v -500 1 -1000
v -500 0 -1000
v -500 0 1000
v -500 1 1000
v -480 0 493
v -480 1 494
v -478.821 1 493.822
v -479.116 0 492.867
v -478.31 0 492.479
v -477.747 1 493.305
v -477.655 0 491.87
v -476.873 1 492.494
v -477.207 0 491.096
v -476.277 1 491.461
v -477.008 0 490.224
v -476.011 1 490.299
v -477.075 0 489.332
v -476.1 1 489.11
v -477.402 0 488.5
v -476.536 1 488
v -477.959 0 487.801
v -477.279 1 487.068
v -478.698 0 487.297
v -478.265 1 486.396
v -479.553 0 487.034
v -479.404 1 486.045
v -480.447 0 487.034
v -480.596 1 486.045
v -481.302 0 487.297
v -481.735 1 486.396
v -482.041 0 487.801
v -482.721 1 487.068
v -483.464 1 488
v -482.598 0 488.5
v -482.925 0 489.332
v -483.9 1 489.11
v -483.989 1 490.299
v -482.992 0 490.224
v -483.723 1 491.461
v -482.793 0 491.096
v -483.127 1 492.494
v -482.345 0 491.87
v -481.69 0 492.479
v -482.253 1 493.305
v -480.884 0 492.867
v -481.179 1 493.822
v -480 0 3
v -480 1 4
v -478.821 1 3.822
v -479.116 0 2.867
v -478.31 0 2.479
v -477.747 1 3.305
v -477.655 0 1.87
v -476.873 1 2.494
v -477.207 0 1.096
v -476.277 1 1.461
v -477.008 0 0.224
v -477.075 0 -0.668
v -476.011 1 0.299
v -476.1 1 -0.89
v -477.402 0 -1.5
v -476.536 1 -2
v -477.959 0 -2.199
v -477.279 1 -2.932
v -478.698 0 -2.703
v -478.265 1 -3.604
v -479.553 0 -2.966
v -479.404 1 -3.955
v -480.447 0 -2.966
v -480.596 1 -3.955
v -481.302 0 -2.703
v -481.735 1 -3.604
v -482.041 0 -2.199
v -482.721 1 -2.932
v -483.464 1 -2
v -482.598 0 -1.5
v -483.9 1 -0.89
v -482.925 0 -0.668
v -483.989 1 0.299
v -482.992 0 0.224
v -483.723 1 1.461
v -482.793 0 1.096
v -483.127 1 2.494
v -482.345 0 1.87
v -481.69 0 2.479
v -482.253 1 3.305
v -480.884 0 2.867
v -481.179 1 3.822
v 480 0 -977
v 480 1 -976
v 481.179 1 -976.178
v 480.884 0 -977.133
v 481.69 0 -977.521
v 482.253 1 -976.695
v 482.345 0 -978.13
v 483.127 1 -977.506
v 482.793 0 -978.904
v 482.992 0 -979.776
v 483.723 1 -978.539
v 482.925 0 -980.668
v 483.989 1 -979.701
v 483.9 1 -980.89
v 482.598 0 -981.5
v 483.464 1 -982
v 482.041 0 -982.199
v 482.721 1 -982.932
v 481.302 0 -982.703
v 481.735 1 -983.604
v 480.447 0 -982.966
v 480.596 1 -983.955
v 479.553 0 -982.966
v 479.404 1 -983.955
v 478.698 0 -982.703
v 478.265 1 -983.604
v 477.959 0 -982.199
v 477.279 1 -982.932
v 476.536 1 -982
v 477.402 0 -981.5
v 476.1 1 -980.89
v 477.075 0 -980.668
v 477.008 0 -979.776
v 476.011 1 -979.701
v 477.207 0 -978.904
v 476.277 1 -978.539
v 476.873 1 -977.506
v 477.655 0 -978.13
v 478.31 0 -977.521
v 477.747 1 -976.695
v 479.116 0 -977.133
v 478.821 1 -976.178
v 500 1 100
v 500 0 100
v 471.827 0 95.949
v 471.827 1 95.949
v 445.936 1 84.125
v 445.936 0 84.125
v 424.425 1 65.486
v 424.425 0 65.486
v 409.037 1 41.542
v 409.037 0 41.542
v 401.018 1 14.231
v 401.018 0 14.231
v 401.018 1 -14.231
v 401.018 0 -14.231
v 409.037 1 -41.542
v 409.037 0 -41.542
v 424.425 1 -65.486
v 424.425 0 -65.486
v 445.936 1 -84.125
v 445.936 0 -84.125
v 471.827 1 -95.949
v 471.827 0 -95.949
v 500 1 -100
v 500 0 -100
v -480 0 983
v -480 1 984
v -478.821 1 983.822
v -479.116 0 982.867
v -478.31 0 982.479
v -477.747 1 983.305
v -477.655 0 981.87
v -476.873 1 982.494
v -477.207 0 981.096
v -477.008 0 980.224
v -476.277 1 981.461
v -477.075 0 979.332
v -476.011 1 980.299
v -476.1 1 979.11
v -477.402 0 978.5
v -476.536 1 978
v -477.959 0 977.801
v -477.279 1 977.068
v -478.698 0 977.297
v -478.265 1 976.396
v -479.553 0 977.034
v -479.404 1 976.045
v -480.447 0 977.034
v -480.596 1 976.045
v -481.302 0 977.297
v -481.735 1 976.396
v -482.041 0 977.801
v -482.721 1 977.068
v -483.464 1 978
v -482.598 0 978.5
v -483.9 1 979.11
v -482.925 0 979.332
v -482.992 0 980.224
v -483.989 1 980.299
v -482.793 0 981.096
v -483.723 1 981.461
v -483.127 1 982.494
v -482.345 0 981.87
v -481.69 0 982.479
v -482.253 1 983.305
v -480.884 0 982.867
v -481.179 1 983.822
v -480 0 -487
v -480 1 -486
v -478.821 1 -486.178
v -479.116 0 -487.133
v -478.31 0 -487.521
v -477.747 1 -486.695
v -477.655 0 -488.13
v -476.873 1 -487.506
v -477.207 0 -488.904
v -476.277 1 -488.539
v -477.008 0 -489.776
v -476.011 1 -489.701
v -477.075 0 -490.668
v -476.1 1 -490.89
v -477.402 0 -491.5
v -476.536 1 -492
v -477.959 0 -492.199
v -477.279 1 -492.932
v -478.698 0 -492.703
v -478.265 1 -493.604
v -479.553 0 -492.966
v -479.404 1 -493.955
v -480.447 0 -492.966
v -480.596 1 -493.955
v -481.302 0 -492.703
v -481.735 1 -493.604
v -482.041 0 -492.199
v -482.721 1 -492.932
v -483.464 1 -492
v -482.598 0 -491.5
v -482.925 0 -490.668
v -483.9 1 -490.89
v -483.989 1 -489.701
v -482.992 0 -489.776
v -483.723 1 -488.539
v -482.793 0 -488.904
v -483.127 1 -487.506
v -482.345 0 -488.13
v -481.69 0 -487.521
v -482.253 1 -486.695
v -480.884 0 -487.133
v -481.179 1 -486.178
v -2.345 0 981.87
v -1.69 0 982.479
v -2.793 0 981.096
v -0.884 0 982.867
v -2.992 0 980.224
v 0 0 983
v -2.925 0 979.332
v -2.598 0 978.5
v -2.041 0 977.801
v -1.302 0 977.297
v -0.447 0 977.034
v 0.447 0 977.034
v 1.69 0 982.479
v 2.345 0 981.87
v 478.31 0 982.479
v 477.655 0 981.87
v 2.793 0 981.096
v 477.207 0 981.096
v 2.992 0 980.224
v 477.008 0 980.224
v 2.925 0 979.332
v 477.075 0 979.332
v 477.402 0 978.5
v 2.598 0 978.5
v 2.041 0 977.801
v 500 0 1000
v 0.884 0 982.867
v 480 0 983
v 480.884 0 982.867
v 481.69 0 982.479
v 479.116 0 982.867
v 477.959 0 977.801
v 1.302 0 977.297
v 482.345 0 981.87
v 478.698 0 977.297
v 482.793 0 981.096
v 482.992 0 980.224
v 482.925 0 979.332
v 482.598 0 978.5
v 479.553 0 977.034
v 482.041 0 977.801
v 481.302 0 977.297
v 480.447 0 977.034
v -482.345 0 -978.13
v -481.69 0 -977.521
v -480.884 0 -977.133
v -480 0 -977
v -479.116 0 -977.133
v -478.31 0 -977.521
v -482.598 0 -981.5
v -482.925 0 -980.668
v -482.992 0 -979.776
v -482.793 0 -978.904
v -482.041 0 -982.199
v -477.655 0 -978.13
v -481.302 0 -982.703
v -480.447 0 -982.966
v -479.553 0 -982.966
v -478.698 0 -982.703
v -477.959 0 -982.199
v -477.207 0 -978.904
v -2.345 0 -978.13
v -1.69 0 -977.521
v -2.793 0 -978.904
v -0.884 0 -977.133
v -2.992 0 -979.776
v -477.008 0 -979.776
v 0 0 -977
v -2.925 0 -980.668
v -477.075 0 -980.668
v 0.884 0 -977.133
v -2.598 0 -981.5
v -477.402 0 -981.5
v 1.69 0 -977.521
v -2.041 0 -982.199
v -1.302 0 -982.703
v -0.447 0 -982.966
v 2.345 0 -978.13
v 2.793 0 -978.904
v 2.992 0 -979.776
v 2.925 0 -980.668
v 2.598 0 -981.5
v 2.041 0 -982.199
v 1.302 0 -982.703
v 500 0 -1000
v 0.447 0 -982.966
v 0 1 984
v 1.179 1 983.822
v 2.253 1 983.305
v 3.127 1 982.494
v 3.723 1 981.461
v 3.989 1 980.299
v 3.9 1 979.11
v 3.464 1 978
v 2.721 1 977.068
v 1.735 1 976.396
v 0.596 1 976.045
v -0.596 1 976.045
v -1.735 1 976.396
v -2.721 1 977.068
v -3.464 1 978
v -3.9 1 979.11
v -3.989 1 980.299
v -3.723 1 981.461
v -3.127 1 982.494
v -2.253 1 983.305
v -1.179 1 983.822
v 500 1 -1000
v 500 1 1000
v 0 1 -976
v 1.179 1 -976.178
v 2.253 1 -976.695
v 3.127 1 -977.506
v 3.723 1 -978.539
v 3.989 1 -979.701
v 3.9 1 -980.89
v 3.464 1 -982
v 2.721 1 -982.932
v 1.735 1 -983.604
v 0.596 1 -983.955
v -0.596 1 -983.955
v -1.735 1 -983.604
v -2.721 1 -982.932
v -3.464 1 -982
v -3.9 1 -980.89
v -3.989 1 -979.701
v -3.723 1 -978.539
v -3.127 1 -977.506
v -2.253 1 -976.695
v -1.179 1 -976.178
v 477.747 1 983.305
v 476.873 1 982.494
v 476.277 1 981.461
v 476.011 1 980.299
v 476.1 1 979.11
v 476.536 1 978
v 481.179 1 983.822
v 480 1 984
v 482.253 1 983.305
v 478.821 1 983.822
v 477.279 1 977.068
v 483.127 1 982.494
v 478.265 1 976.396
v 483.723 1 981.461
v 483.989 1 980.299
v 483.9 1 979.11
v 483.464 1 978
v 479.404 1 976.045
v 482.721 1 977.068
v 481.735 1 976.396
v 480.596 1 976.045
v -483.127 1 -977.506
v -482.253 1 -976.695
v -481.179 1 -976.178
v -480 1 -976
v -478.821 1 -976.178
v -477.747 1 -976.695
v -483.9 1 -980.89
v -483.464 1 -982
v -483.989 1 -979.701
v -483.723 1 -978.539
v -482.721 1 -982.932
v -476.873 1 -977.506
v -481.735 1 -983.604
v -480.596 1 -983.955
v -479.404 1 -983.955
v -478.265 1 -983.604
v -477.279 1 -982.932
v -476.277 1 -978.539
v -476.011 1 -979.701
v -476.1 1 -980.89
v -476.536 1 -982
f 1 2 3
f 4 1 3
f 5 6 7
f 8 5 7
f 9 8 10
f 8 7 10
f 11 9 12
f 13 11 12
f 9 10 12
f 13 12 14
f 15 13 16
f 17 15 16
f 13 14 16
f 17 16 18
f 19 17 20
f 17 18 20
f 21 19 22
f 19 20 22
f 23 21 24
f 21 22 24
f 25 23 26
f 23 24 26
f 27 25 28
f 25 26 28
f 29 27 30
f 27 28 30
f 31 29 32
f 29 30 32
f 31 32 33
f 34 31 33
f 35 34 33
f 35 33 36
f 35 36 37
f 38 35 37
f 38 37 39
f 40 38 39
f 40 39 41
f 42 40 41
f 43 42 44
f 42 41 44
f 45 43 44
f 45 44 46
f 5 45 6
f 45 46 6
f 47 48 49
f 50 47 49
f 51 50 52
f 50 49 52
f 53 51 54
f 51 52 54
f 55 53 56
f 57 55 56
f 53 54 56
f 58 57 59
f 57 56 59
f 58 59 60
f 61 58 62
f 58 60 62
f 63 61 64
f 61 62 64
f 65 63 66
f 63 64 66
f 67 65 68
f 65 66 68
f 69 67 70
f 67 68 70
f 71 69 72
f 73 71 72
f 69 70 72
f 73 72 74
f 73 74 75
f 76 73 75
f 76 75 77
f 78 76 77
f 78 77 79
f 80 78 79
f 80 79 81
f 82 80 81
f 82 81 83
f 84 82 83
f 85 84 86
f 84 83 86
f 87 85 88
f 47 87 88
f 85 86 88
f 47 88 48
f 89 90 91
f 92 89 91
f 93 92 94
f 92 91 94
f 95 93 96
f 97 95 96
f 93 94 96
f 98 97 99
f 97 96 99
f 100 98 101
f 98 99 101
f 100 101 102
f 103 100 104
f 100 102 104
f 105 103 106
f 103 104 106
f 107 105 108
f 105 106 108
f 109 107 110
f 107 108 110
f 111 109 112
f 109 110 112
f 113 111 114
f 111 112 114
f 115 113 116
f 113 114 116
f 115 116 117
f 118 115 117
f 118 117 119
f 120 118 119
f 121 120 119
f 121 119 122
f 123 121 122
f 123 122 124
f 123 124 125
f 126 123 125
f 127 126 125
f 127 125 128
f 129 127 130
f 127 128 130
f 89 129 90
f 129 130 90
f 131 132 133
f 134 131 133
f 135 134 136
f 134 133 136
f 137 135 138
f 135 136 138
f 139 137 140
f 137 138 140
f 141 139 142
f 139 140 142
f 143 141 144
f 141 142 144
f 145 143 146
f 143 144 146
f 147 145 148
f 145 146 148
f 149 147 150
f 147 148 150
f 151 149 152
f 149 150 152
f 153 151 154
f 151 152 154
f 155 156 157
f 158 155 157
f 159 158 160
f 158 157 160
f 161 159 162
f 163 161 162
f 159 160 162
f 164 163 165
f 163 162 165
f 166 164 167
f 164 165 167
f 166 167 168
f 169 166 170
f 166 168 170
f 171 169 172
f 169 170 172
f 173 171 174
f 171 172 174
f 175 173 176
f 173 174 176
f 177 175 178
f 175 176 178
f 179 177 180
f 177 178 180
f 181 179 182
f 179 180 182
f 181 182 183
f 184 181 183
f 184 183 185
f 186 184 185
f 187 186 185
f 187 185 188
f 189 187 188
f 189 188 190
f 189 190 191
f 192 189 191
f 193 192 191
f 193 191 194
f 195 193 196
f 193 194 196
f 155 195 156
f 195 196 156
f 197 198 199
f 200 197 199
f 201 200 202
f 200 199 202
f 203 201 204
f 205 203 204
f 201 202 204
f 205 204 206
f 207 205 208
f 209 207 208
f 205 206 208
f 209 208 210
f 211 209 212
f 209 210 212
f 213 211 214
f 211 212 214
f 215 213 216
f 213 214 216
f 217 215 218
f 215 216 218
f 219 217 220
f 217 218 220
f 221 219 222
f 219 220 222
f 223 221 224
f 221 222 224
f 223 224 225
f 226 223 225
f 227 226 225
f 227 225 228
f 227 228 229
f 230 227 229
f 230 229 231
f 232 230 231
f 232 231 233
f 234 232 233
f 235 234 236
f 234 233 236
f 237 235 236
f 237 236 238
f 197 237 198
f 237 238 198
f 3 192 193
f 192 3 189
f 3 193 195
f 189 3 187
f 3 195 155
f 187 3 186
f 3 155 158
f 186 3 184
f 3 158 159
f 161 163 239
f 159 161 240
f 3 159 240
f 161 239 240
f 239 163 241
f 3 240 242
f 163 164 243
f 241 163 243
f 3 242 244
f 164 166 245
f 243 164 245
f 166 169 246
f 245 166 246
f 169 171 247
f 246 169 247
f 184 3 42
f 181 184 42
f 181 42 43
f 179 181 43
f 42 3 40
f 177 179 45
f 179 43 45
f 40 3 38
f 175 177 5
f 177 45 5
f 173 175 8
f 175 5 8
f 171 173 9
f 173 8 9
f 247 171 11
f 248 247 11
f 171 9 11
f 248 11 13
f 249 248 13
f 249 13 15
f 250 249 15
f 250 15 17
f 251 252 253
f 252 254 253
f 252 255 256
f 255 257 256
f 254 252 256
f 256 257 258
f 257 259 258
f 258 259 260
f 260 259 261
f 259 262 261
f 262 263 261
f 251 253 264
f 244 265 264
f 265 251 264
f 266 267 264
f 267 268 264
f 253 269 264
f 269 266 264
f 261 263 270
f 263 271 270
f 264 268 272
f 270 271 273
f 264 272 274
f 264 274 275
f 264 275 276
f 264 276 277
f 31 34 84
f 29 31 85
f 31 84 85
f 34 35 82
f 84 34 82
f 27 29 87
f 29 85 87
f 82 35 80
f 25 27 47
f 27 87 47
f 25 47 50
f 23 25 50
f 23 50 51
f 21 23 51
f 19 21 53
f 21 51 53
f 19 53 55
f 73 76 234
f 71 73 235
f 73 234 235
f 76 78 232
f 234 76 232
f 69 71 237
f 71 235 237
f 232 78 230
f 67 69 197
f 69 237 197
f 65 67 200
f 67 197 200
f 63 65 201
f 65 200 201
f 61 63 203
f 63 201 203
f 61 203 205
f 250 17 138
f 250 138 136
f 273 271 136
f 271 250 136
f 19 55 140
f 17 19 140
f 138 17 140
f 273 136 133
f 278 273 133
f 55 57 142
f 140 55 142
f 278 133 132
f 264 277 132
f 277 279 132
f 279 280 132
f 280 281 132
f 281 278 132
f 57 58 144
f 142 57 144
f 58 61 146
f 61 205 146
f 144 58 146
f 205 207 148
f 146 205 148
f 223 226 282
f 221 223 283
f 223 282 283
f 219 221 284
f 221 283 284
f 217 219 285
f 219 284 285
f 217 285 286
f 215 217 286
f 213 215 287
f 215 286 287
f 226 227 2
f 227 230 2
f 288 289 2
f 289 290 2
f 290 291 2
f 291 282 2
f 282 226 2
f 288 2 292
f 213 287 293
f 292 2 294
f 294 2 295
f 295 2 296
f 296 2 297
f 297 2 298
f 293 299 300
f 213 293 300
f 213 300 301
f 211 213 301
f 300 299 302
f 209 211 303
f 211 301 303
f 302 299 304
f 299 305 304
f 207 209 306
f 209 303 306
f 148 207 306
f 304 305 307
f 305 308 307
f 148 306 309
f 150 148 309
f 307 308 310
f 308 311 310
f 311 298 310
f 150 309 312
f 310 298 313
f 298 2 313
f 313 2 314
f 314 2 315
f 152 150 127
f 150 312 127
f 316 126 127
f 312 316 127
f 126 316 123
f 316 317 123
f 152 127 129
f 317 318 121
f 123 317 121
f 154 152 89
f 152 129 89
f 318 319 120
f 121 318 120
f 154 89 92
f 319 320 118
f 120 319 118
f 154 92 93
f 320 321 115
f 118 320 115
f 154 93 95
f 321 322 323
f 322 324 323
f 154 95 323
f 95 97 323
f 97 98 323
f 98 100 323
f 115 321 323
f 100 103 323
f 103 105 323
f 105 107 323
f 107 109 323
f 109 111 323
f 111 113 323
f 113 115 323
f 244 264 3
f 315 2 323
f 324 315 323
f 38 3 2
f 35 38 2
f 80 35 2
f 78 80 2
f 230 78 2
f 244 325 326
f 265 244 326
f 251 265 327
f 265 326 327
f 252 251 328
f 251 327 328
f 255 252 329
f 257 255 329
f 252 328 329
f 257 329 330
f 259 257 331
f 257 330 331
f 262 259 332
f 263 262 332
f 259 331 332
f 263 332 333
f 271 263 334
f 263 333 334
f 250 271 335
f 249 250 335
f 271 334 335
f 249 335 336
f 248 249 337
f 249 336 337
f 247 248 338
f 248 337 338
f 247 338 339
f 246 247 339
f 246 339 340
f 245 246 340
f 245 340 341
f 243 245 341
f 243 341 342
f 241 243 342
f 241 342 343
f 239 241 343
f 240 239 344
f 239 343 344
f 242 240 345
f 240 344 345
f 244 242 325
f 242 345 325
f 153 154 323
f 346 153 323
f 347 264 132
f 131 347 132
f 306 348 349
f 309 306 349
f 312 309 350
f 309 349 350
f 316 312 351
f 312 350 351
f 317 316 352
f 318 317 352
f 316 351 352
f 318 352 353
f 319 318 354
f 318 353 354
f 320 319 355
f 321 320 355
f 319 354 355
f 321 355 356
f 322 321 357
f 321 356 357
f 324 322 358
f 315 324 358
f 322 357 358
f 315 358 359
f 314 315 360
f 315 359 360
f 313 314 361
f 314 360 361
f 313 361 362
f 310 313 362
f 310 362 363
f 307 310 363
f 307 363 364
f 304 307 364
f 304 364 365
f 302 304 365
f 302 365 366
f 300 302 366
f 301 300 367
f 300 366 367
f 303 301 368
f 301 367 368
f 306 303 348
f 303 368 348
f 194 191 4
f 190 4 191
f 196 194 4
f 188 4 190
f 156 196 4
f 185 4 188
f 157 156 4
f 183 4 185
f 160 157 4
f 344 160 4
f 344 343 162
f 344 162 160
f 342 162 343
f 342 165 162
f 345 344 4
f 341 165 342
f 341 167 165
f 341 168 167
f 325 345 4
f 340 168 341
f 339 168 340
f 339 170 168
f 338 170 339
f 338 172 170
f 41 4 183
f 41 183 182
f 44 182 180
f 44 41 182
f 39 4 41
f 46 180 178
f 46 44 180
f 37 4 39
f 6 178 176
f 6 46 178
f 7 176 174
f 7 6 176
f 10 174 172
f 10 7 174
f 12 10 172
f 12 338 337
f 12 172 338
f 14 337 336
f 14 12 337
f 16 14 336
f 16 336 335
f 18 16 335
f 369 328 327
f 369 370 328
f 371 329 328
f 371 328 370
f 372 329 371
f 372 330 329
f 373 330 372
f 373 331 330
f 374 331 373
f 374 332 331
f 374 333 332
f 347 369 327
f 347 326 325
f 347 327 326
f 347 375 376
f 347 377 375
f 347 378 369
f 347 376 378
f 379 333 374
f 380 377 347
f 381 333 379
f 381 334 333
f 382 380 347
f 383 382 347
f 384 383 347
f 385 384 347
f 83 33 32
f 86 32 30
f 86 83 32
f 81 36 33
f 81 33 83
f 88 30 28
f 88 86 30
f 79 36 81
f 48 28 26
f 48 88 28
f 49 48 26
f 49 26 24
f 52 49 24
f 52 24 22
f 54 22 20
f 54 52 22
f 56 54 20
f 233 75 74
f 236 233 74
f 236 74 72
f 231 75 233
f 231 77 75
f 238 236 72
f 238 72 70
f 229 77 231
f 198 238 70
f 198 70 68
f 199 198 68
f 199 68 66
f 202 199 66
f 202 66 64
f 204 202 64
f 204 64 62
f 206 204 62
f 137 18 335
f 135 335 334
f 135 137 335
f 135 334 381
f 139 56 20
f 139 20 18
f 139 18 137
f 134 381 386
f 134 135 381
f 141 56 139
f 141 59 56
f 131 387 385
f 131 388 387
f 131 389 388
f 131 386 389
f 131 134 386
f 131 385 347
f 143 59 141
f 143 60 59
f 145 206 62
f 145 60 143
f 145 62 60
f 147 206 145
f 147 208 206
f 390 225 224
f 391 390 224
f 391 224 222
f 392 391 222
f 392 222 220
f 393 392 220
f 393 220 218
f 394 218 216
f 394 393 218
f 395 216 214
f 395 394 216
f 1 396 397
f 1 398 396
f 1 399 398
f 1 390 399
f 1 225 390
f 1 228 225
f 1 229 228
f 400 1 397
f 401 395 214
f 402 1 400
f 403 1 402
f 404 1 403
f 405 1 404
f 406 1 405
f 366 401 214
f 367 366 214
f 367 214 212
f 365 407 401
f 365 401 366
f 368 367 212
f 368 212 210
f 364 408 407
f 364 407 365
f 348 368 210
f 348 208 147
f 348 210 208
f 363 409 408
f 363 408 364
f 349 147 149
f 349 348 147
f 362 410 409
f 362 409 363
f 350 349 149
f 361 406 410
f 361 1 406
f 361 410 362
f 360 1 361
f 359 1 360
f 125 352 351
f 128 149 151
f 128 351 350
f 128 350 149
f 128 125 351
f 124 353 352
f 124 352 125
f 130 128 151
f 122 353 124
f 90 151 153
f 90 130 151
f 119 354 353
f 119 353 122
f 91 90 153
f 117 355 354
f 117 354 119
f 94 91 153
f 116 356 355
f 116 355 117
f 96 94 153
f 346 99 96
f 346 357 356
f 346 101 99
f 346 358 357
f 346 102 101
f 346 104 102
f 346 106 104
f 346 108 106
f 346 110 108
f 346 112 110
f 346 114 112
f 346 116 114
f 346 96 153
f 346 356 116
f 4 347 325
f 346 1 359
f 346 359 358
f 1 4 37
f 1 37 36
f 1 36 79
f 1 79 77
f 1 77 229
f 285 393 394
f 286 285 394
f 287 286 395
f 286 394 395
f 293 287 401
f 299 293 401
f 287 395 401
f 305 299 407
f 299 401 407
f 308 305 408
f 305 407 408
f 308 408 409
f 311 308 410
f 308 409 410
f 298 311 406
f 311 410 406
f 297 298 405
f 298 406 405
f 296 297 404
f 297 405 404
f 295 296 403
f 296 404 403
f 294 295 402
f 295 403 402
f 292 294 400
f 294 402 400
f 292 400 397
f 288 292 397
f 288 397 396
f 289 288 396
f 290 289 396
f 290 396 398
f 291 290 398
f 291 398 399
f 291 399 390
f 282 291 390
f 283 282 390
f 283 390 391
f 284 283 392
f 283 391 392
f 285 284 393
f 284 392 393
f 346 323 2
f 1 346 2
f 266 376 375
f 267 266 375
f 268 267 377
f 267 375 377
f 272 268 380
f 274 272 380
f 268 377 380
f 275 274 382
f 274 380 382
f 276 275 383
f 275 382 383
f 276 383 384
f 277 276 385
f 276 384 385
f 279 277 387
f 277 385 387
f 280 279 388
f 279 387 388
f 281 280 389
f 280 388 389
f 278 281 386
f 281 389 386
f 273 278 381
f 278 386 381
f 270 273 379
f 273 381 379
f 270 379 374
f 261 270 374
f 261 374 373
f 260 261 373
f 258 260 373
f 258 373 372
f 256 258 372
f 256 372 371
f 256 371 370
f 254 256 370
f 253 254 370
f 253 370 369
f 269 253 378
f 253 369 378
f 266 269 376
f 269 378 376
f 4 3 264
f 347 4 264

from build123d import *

# Parameters (mm, degrees)
SKETCH1_R           = 3
BOSS_EXTRUDE1_DEPTH = 1
CHAMFER1_SIZE       = 1


with BuildPart() as part:
    # Sketch1 → Boss-Extrude1 (new body)
    with BuildSketch(Plane(origin=(0, 0, 0), x_dir=(1, 0, 0), z_dir=(0, 1, 0))):
        with BuildLine():
            Line((-500, -1000), (500, -1000))
            Line((500, -1000), (500, -100))
            ThreePointArc((500, -100), (400, 0), (500, 100))
            Line((500, 100), (500, 1000))
            Line((500, 1000), (-500, 1000))
            Line((-500, 1000), (-500, -1000))
        make_face()
        with Locations(Location((-480, 490, 0), (0, 0, 270))):
            Circle(SKETCH1_R, mode=Mode.SUBTRACT)
        with Locations(Location((-480, -980, 0), (0, 0, 270))):
            Circle(SKETCH1_R, mode=Mode.SUBTRACT)
        with Locations(Location((480, -980, 0), (0, 0, 270))):
            Circle(SKETCH1_R, mode=Mode.SUBTRACT)
        with Locations(Location((480, 980, 0), (0, 0, 270))):
            Circle(SKETCH1_R, mode=Mode.SUBTRACT)
        with Locations(Location((-480, 980, 0), (0, 0, 270))):
            Circle(SKETCH1_R, mode=Mode.SUBTRACT)
        with Locations(Location((-480, 0, 0), (0, 0, 270))):
            Circle(SKETCH1_R, mode=Mode.SUBTRACT)
        with Locations(Location((-480, -490, 0), (0, 0, 270))):
            Circle(SKETCH1_R, mode=Mode.SUBTRACT)
        with Locations(Location((0, -980, 0), (0, 0, 270))):
            Circle(SKETCH1_R, mode=Mode.SUBTRACT)
        with Locations(Location((0, 980, 0), (0, 0, 270))):
            Circle(SKETCH1_R, mode=Mode.SUBTRACT)
    extrude(amount=BOSS_EXTRUDE1_DEPTH)

    # Chamfer1
    chamfer1_edges = [part.edges().sort_by_distance(p)[0] for p in [
        (0, 1, -983),
        (0, 1, 977),
        (-480, 1, 487),
        (-480, 1, -3),
        (-480, 1, -983),
        (480, 1, -983),
        (480, 1, 977),
        (-480, 1, 977),
        (-480, 1, -493),
    ]]
    chamfer(chamfer1_edges, length=CHAMFER1_SIZE - 0.0001)  # a hair under: the kernel refuses the full size


solid = part.part
